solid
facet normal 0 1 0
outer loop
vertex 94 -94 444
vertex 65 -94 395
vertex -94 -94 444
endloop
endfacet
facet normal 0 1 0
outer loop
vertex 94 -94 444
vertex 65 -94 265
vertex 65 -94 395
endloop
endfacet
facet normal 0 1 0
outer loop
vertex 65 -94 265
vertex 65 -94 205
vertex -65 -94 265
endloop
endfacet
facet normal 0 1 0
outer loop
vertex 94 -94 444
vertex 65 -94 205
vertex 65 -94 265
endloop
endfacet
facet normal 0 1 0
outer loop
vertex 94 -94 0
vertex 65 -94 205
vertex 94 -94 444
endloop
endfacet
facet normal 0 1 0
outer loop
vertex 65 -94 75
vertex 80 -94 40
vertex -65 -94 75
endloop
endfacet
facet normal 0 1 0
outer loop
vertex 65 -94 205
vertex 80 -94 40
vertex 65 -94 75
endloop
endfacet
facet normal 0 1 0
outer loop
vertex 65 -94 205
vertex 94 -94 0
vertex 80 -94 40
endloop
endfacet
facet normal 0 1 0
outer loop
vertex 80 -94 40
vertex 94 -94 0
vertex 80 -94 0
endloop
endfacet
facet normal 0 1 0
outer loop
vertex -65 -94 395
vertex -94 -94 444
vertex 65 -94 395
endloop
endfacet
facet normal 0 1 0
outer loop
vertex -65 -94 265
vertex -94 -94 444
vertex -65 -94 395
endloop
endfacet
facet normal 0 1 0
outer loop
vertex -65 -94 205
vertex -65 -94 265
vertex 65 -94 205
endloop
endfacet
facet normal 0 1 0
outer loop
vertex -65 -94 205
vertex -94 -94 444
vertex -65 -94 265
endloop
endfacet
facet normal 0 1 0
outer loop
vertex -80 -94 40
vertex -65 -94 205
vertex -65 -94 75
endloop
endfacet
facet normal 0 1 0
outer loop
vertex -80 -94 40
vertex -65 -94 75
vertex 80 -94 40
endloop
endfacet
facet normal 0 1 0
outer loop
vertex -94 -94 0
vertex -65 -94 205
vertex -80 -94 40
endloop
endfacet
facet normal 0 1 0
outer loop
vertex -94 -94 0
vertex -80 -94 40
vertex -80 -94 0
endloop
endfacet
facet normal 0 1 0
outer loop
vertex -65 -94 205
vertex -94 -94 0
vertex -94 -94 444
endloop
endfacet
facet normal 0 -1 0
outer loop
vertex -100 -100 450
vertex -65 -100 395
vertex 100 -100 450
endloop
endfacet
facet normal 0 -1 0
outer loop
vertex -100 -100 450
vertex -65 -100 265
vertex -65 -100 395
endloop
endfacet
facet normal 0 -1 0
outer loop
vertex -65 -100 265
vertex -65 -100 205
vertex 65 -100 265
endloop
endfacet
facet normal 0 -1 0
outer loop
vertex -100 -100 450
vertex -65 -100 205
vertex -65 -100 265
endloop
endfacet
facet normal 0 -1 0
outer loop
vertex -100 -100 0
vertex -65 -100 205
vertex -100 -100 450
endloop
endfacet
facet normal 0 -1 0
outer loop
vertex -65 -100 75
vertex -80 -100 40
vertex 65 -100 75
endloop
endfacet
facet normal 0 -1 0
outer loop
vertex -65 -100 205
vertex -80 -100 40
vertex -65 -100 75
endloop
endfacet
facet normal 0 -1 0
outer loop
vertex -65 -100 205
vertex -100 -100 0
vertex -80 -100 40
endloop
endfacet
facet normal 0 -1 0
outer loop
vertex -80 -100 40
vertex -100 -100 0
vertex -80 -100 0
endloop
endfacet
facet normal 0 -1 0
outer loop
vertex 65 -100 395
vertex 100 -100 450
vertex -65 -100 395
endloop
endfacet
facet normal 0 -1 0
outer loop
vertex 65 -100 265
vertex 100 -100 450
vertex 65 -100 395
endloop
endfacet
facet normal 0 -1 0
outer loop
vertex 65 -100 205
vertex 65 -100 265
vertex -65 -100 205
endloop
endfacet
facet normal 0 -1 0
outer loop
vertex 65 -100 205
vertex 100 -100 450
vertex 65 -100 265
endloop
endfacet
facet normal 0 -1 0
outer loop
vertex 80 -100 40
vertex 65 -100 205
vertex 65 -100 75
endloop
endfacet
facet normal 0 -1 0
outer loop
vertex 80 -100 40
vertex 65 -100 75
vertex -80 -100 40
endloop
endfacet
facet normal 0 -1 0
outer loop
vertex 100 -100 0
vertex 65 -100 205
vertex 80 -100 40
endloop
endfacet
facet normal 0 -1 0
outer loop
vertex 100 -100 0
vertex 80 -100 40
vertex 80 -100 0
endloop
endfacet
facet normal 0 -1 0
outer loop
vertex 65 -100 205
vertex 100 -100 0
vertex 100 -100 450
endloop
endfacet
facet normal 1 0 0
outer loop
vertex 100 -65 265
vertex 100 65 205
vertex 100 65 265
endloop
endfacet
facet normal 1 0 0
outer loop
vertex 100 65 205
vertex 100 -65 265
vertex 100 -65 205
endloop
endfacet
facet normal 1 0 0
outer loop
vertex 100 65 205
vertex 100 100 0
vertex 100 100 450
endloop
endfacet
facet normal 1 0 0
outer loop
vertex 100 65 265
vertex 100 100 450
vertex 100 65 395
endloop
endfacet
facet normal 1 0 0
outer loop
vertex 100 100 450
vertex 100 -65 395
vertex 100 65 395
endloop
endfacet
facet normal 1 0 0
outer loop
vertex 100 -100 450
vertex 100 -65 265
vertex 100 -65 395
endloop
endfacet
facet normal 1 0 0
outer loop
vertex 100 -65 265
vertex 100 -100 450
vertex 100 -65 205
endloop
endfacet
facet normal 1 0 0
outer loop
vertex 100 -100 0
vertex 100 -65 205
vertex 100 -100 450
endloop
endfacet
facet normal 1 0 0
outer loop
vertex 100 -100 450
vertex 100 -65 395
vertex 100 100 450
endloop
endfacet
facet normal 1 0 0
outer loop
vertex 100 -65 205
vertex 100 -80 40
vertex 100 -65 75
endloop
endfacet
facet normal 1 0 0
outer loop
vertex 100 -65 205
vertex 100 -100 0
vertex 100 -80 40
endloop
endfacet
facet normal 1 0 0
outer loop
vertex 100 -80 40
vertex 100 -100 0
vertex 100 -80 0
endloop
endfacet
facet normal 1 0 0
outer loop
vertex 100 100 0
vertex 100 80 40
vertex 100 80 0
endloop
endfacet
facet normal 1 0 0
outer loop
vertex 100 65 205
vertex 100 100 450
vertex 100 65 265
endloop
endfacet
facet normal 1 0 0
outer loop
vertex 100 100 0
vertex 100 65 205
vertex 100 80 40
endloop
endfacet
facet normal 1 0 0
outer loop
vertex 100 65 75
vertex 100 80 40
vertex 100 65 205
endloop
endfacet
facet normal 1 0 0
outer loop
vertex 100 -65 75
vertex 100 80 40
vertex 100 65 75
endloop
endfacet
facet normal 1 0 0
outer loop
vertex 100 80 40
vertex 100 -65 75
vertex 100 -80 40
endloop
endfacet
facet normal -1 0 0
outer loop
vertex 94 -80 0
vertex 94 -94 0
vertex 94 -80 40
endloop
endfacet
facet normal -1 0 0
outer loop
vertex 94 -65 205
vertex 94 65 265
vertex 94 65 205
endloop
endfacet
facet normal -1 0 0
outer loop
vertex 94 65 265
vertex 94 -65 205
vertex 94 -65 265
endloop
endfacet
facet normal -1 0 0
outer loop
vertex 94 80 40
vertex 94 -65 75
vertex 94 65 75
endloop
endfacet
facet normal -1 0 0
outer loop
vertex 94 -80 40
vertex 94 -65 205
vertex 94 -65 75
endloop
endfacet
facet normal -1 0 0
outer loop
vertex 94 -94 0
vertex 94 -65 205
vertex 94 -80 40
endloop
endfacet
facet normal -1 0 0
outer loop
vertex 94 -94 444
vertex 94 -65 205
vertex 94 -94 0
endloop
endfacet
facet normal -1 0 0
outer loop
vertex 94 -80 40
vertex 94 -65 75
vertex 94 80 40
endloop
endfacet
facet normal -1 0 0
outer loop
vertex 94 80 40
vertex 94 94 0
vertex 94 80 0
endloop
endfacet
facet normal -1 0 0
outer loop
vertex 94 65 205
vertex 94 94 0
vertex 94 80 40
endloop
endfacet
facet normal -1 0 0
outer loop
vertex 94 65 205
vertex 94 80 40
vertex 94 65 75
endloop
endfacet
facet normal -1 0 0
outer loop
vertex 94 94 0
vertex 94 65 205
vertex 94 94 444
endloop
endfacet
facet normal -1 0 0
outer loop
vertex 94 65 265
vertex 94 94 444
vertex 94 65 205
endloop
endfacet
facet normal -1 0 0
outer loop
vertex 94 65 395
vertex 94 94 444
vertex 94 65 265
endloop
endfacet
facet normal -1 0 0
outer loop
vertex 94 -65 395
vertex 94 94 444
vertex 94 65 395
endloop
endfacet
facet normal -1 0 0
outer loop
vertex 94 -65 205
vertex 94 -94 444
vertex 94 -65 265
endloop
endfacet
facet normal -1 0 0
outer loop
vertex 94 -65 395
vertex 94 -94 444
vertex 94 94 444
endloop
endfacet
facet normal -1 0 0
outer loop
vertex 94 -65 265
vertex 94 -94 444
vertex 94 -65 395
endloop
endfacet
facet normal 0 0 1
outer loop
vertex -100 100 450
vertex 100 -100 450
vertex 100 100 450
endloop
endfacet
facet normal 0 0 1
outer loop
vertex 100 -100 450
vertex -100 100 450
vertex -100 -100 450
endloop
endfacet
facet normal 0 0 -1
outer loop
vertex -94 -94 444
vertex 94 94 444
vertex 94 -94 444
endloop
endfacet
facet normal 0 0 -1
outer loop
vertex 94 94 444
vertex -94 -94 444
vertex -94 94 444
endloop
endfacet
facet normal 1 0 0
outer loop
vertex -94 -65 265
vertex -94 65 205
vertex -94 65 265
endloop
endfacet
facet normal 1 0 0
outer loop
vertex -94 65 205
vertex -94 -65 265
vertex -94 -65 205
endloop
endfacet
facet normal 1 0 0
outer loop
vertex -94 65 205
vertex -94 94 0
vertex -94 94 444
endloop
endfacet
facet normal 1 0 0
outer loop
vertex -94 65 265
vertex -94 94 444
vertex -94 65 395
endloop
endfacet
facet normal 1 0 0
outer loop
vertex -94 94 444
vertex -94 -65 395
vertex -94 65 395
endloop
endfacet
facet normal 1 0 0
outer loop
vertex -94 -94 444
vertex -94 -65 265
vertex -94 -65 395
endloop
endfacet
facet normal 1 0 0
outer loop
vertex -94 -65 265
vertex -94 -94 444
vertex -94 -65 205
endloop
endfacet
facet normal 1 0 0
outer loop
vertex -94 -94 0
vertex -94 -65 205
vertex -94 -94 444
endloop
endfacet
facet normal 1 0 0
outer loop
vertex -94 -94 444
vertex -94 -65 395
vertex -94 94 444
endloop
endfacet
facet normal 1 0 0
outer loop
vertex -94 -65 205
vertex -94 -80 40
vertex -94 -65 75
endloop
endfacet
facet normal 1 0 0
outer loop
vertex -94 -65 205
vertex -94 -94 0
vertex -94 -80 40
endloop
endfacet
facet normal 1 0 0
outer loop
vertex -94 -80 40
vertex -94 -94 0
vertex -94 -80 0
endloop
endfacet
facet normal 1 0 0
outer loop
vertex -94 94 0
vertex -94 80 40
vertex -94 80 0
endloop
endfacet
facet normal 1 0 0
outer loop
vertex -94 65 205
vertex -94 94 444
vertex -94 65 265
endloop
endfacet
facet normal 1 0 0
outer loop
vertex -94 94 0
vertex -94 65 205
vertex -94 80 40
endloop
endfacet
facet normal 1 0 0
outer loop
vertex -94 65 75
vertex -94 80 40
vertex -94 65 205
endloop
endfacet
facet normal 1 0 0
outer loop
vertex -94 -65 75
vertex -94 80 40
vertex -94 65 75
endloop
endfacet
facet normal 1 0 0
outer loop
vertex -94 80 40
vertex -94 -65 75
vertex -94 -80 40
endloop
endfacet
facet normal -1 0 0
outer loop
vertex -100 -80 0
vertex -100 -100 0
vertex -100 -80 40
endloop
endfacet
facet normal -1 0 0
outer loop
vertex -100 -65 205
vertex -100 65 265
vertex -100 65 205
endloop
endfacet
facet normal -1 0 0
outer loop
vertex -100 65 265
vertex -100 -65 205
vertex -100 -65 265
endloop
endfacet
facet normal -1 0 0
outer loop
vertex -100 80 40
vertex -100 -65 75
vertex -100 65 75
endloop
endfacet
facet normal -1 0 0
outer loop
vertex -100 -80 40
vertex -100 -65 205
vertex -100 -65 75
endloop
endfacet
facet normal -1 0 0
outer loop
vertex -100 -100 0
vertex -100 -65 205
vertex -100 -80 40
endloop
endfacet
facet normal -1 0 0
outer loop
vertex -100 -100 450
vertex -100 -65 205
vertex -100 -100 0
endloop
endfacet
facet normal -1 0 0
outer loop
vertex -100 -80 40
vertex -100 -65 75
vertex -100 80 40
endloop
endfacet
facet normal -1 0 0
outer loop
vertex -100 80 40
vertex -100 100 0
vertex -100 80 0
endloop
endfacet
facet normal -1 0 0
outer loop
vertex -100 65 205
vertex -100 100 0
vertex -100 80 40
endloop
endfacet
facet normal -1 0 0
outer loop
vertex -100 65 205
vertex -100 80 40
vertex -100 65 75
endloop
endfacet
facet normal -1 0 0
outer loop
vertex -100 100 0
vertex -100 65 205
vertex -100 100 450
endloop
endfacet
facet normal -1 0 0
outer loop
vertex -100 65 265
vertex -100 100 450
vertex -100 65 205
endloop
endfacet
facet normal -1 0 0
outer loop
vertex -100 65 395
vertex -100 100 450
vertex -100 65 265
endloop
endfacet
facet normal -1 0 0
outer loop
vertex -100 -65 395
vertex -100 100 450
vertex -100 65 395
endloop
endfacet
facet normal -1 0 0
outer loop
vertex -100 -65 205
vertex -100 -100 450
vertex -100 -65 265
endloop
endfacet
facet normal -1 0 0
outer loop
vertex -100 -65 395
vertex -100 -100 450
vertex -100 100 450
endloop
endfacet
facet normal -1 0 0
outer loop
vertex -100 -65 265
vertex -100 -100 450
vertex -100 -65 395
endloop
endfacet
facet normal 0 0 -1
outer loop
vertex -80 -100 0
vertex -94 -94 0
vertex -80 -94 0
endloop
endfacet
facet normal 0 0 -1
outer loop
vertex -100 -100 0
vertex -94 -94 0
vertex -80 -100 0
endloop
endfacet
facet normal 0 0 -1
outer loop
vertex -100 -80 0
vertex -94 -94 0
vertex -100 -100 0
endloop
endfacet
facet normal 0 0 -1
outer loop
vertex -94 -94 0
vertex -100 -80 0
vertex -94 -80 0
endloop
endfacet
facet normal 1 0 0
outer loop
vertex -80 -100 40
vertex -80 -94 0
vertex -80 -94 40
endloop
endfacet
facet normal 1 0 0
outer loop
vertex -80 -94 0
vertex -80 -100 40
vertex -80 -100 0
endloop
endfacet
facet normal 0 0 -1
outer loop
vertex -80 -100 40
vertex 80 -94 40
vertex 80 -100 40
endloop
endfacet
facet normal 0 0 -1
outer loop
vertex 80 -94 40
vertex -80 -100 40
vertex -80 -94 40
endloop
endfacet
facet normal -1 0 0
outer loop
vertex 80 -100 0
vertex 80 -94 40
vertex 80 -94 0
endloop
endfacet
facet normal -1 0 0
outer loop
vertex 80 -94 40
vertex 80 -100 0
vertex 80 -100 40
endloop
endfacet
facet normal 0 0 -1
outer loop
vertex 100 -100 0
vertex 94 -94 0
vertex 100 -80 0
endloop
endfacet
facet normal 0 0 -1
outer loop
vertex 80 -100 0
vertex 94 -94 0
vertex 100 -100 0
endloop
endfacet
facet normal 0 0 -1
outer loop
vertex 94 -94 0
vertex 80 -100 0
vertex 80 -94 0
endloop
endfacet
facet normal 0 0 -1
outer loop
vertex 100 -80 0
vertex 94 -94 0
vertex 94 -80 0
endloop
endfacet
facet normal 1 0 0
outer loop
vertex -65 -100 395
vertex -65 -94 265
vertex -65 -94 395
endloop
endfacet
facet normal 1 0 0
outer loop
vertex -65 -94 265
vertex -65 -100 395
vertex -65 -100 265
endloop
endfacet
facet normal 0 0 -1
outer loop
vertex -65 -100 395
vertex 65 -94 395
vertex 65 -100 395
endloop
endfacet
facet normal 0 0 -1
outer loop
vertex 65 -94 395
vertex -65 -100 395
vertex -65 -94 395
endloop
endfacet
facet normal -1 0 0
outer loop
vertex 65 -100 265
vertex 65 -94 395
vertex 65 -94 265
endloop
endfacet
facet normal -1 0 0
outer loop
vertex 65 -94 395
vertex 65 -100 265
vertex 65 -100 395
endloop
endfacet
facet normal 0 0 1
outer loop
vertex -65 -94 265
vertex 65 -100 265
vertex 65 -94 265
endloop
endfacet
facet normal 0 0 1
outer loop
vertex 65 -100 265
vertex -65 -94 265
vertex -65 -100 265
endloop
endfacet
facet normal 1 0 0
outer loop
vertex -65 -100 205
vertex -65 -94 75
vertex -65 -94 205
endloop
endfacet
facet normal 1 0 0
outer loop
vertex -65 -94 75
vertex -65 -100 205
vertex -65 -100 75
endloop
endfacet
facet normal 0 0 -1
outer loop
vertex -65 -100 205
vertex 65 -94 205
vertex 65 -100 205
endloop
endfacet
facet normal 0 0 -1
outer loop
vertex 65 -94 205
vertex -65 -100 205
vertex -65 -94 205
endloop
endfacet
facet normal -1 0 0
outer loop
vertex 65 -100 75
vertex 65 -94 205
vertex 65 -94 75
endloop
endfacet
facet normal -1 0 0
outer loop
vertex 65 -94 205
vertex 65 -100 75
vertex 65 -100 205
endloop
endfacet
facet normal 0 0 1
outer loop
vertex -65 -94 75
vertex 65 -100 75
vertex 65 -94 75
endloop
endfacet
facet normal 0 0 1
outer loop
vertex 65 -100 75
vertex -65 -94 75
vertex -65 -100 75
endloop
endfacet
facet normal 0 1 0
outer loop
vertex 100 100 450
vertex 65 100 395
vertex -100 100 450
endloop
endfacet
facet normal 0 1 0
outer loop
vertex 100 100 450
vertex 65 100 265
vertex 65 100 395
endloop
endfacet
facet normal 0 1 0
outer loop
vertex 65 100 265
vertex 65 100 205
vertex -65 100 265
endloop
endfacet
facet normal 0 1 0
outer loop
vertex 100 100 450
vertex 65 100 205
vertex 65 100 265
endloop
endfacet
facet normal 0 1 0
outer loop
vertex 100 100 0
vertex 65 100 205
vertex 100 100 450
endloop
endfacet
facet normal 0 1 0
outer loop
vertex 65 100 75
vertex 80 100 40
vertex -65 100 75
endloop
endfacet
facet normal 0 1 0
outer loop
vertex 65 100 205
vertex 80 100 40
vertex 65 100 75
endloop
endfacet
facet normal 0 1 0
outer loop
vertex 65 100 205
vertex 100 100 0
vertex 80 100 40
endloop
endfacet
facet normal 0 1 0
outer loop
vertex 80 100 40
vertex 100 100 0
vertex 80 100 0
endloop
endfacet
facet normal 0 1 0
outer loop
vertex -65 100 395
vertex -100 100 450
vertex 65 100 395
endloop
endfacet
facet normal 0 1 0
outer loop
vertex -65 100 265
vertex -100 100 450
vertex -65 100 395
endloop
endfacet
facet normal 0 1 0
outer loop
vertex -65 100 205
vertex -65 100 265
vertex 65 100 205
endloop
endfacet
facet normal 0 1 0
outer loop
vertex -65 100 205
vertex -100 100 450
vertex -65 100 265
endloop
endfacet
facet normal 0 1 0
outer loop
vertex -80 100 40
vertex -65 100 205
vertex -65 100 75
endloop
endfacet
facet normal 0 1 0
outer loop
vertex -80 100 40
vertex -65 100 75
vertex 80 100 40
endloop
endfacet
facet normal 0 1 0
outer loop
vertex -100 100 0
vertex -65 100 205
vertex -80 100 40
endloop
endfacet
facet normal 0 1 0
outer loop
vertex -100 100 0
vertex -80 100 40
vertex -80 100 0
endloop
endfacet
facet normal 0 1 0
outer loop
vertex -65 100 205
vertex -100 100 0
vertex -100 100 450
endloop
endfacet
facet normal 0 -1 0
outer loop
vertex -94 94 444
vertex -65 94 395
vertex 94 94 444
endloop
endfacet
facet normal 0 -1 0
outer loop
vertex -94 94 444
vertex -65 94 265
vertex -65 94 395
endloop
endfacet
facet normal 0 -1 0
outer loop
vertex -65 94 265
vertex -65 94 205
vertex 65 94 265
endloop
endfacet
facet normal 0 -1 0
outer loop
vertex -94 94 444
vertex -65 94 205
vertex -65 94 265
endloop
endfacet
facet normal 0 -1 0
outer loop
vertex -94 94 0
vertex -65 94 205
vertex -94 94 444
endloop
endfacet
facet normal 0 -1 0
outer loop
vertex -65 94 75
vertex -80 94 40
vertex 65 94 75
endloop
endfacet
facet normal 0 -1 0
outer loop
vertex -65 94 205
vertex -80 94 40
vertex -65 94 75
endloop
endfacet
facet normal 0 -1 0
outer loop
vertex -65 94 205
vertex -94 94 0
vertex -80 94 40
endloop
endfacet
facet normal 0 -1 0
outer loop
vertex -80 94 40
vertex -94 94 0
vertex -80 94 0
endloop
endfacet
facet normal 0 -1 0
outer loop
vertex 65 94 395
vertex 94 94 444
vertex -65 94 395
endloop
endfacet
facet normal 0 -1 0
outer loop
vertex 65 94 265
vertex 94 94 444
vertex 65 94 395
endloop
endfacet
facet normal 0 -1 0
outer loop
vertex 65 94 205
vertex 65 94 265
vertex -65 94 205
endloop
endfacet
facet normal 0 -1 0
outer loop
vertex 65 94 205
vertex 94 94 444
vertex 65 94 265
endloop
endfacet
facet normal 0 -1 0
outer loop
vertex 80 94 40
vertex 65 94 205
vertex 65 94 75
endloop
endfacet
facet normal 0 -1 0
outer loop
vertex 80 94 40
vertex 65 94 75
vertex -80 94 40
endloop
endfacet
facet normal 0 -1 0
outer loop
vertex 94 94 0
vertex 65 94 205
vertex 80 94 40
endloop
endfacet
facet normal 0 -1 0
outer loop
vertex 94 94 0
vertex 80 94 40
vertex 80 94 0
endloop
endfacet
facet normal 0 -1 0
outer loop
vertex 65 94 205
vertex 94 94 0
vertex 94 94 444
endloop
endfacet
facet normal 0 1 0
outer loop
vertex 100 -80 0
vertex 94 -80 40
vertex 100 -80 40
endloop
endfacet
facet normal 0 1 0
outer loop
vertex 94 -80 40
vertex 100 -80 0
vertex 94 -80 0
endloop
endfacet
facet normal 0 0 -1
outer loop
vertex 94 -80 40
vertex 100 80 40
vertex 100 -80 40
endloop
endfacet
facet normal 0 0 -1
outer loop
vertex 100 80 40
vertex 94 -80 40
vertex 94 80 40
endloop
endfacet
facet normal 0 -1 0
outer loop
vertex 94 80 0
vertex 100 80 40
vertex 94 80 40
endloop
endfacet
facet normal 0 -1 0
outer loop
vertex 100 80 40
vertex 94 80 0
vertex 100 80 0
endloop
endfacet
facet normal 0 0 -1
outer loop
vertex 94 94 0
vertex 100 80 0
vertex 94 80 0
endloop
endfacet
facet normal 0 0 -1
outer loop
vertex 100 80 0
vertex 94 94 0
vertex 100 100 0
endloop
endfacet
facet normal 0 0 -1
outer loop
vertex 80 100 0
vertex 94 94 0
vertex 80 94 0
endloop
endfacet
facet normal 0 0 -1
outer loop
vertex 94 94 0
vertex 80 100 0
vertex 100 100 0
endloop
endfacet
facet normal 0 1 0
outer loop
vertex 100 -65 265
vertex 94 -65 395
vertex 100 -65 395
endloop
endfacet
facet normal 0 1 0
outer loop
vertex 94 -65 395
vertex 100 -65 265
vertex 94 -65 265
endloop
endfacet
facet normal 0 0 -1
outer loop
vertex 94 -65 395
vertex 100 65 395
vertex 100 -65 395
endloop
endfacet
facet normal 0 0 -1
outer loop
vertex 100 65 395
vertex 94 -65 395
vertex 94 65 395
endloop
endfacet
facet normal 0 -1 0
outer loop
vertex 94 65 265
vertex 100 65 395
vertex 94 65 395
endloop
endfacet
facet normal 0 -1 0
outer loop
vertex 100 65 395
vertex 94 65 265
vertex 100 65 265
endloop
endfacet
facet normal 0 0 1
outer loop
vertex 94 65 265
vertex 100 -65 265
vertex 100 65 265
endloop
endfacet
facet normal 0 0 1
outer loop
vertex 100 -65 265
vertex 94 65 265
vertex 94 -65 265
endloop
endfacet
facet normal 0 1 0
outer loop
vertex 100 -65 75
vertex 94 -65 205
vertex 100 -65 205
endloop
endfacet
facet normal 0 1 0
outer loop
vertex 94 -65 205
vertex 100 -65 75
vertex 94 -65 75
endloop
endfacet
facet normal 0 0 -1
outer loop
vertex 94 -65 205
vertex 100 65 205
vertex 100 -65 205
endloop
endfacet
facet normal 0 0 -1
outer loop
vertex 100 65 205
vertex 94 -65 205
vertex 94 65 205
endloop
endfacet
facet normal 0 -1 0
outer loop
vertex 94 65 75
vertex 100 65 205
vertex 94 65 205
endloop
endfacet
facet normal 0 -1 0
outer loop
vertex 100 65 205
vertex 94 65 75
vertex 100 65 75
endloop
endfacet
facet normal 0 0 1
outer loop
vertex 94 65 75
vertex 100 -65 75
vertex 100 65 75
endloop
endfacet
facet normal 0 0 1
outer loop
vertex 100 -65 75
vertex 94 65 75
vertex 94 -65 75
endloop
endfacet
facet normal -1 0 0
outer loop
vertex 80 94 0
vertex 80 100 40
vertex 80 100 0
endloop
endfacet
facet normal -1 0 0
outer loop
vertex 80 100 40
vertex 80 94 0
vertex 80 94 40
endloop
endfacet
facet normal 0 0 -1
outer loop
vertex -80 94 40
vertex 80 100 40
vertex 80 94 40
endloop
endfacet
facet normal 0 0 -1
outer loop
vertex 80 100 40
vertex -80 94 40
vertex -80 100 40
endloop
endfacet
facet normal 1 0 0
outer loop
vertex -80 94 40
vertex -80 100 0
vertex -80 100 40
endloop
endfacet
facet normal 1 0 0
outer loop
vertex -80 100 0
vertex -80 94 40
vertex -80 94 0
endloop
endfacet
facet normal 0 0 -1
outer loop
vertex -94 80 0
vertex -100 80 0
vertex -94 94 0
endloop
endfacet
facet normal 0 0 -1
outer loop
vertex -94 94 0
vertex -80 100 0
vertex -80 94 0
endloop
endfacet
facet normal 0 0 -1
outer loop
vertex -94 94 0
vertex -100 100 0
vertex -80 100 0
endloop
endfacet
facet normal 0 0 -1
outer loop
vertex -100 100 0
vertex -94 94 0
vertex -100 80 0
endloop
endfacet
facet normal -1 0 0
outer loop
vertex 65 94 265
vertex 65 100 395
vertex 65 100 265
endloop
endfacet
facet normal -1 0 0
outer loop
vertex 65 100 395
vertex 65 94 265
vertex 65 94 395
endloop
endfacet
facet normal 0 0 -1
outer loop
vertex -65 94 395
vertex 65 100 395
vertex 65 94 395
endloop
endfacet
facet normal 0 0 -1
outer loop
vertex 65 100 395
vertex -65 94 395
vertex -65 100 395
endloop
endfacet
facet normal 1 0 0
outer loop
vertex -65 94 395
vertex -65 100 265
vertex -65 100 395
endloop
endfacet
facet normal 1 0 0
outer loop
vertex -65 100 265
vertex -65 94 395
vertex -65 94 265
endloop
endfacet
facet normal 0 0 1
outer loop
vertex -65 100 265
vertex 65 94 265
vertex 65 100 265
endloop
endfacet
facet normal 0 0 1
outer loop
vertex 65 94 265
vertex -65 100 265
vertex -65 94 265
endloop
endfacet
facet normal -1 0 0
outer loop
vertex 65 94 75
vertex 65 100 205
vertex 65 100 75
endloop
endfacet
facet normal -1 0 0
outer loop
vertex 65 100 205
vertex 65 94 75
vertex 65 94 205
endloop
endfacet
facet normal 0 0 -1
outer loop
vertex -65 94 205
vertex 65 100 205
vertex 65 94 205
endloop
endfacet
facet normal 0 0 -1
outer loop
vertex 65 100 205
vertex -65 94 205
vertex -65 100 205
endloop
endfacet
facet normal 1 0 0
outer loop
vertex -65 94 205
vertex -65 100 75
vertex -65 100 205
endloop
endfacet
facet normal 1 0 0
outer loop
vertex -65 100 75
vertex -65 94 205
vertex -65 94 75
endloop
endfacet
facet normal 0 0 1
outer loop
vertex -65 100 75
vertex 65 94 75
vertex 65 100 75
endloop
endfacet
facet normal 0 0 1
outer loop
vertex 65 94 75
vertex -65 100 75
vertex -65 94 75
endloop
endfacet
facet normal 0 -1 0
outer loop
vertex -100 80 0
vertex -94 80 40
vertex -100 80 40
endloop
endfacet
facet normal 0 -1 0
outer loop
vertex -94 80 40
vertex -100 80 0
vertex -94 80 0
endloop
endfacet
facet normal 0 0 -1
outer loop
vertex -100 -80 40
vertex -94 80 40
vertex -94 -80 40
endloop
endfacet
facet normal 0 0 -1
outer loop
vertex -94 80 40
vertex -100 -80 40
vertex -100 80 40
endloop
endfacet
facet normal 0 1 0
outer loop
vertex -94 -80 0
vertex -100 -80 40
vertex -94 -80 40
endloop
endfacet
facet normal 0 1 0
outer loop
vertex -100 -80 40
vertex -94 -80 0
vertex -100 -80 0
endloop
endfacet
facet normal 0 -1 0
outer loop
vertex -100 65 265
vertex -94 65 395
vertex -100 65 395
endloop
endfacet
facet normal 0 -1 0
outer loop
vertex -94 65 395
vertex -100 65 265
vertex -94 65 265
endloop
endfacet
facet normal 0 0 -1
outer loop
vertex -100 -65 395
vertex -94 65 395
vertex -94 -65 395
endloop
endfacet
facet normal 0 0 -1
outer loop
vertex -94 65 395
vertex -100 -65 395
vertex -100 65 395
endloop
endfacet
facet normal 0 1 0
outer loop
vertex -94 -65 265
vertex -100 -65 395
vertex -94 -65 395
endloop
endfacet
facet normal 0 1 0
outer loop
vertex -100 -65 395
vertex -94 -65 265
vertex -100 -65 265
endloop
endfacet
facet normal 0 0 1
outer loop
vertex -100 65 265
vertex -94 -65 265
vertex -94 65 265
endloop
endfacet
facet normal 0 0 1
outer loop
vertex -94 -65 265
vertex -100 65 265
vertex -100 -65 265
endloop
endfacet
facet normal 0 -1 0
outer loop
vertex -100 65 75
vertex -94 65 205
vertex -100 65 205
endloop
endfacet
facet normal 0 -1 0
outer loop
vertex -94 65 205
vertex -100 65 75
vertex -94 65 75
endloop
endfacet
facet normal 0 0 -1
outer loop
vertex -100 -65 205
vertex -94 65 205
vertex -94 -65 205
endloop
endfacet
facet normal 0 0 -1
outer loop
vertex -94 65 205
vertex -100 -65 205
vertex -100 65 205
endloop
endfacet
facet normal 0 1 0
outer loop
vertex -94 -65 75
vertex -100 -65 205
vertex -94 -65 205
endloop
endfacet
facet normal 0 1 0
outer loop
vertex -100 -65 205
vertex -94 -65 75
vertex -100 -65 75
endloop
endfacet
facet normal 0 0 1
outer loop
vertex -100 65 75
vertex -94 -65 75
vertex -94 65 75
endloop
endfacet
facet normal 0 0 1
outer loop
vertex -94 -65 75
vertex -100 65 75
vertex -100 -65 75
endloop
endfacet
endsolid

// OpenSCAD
dim_width = 200;
dim_height = 450;
dim_window = 130;
dim_winpos = [ 140, 330 ];
dim_teeth = 20;
dim_thick = 6;
dim_foots = 40;

colors = [ "orange", "green", "orange", "green", "blue" ];
explode = 0;

module top_stage0()
{
	translate([-dim_width/2, -dim_width/2])
	difference() {
		square(dim_width);
		for (i = [0:dim_width/(2*dim_teeth)-1])
			translate([0, i*2*dim_teeth]) square([dim_thick, dim_teeth]);
	}
}

module top_stage1()
{
	intersection_for(angle = [0:90:270])
		rotate(angle) top_stage0();
}

module side_stage0()
{
	difference() {
		translate([-dim_width/2, 0]) square([dim_width, dim_height]);
		for (p = dim_winpos)
			translate([0, p]) square(dim_window, center = true);
		for (i = [1:dim_height/(2*dim_teeth)-1])
			translate([-dim_width/2, i*2*dim_teeth]) square([dim_thick, dim_teeth]);
		square([dim_width - dim_foots, 2*dim_foots], center = true);
	}
}

module side_stage1()
{
	difference() {
		side_stage0();
		translate([dim_width - dim_thick, 0]) side_stage0();
		translate([0, dim_height + dim_width/2 - dim_thick]) top_stage1();
	}
}

module cuttr()
{
	for (i = [0:3])
		translate([(dim_width+dim_thick)*i, 0]) side_stage1();
	translate([(dim_width+dim_thick)*4, dim_height/2]) top_stage1();
}

module model()
{
	for (i = [0:3])
		rotate([0, 0, 90*i]) translate([0, -dim_width/2 + dim_thick - explode, 0])
		rotate([90, 0, 0]) color(colors[i]) linear_extrude(dim_thick) side_stage1();
	translate([0, 0, dim_height - dim_thick + explode])
		color(colors[4]) linear_extrude(dim_thick) top_stage1();
}

// cuttr();
model();
